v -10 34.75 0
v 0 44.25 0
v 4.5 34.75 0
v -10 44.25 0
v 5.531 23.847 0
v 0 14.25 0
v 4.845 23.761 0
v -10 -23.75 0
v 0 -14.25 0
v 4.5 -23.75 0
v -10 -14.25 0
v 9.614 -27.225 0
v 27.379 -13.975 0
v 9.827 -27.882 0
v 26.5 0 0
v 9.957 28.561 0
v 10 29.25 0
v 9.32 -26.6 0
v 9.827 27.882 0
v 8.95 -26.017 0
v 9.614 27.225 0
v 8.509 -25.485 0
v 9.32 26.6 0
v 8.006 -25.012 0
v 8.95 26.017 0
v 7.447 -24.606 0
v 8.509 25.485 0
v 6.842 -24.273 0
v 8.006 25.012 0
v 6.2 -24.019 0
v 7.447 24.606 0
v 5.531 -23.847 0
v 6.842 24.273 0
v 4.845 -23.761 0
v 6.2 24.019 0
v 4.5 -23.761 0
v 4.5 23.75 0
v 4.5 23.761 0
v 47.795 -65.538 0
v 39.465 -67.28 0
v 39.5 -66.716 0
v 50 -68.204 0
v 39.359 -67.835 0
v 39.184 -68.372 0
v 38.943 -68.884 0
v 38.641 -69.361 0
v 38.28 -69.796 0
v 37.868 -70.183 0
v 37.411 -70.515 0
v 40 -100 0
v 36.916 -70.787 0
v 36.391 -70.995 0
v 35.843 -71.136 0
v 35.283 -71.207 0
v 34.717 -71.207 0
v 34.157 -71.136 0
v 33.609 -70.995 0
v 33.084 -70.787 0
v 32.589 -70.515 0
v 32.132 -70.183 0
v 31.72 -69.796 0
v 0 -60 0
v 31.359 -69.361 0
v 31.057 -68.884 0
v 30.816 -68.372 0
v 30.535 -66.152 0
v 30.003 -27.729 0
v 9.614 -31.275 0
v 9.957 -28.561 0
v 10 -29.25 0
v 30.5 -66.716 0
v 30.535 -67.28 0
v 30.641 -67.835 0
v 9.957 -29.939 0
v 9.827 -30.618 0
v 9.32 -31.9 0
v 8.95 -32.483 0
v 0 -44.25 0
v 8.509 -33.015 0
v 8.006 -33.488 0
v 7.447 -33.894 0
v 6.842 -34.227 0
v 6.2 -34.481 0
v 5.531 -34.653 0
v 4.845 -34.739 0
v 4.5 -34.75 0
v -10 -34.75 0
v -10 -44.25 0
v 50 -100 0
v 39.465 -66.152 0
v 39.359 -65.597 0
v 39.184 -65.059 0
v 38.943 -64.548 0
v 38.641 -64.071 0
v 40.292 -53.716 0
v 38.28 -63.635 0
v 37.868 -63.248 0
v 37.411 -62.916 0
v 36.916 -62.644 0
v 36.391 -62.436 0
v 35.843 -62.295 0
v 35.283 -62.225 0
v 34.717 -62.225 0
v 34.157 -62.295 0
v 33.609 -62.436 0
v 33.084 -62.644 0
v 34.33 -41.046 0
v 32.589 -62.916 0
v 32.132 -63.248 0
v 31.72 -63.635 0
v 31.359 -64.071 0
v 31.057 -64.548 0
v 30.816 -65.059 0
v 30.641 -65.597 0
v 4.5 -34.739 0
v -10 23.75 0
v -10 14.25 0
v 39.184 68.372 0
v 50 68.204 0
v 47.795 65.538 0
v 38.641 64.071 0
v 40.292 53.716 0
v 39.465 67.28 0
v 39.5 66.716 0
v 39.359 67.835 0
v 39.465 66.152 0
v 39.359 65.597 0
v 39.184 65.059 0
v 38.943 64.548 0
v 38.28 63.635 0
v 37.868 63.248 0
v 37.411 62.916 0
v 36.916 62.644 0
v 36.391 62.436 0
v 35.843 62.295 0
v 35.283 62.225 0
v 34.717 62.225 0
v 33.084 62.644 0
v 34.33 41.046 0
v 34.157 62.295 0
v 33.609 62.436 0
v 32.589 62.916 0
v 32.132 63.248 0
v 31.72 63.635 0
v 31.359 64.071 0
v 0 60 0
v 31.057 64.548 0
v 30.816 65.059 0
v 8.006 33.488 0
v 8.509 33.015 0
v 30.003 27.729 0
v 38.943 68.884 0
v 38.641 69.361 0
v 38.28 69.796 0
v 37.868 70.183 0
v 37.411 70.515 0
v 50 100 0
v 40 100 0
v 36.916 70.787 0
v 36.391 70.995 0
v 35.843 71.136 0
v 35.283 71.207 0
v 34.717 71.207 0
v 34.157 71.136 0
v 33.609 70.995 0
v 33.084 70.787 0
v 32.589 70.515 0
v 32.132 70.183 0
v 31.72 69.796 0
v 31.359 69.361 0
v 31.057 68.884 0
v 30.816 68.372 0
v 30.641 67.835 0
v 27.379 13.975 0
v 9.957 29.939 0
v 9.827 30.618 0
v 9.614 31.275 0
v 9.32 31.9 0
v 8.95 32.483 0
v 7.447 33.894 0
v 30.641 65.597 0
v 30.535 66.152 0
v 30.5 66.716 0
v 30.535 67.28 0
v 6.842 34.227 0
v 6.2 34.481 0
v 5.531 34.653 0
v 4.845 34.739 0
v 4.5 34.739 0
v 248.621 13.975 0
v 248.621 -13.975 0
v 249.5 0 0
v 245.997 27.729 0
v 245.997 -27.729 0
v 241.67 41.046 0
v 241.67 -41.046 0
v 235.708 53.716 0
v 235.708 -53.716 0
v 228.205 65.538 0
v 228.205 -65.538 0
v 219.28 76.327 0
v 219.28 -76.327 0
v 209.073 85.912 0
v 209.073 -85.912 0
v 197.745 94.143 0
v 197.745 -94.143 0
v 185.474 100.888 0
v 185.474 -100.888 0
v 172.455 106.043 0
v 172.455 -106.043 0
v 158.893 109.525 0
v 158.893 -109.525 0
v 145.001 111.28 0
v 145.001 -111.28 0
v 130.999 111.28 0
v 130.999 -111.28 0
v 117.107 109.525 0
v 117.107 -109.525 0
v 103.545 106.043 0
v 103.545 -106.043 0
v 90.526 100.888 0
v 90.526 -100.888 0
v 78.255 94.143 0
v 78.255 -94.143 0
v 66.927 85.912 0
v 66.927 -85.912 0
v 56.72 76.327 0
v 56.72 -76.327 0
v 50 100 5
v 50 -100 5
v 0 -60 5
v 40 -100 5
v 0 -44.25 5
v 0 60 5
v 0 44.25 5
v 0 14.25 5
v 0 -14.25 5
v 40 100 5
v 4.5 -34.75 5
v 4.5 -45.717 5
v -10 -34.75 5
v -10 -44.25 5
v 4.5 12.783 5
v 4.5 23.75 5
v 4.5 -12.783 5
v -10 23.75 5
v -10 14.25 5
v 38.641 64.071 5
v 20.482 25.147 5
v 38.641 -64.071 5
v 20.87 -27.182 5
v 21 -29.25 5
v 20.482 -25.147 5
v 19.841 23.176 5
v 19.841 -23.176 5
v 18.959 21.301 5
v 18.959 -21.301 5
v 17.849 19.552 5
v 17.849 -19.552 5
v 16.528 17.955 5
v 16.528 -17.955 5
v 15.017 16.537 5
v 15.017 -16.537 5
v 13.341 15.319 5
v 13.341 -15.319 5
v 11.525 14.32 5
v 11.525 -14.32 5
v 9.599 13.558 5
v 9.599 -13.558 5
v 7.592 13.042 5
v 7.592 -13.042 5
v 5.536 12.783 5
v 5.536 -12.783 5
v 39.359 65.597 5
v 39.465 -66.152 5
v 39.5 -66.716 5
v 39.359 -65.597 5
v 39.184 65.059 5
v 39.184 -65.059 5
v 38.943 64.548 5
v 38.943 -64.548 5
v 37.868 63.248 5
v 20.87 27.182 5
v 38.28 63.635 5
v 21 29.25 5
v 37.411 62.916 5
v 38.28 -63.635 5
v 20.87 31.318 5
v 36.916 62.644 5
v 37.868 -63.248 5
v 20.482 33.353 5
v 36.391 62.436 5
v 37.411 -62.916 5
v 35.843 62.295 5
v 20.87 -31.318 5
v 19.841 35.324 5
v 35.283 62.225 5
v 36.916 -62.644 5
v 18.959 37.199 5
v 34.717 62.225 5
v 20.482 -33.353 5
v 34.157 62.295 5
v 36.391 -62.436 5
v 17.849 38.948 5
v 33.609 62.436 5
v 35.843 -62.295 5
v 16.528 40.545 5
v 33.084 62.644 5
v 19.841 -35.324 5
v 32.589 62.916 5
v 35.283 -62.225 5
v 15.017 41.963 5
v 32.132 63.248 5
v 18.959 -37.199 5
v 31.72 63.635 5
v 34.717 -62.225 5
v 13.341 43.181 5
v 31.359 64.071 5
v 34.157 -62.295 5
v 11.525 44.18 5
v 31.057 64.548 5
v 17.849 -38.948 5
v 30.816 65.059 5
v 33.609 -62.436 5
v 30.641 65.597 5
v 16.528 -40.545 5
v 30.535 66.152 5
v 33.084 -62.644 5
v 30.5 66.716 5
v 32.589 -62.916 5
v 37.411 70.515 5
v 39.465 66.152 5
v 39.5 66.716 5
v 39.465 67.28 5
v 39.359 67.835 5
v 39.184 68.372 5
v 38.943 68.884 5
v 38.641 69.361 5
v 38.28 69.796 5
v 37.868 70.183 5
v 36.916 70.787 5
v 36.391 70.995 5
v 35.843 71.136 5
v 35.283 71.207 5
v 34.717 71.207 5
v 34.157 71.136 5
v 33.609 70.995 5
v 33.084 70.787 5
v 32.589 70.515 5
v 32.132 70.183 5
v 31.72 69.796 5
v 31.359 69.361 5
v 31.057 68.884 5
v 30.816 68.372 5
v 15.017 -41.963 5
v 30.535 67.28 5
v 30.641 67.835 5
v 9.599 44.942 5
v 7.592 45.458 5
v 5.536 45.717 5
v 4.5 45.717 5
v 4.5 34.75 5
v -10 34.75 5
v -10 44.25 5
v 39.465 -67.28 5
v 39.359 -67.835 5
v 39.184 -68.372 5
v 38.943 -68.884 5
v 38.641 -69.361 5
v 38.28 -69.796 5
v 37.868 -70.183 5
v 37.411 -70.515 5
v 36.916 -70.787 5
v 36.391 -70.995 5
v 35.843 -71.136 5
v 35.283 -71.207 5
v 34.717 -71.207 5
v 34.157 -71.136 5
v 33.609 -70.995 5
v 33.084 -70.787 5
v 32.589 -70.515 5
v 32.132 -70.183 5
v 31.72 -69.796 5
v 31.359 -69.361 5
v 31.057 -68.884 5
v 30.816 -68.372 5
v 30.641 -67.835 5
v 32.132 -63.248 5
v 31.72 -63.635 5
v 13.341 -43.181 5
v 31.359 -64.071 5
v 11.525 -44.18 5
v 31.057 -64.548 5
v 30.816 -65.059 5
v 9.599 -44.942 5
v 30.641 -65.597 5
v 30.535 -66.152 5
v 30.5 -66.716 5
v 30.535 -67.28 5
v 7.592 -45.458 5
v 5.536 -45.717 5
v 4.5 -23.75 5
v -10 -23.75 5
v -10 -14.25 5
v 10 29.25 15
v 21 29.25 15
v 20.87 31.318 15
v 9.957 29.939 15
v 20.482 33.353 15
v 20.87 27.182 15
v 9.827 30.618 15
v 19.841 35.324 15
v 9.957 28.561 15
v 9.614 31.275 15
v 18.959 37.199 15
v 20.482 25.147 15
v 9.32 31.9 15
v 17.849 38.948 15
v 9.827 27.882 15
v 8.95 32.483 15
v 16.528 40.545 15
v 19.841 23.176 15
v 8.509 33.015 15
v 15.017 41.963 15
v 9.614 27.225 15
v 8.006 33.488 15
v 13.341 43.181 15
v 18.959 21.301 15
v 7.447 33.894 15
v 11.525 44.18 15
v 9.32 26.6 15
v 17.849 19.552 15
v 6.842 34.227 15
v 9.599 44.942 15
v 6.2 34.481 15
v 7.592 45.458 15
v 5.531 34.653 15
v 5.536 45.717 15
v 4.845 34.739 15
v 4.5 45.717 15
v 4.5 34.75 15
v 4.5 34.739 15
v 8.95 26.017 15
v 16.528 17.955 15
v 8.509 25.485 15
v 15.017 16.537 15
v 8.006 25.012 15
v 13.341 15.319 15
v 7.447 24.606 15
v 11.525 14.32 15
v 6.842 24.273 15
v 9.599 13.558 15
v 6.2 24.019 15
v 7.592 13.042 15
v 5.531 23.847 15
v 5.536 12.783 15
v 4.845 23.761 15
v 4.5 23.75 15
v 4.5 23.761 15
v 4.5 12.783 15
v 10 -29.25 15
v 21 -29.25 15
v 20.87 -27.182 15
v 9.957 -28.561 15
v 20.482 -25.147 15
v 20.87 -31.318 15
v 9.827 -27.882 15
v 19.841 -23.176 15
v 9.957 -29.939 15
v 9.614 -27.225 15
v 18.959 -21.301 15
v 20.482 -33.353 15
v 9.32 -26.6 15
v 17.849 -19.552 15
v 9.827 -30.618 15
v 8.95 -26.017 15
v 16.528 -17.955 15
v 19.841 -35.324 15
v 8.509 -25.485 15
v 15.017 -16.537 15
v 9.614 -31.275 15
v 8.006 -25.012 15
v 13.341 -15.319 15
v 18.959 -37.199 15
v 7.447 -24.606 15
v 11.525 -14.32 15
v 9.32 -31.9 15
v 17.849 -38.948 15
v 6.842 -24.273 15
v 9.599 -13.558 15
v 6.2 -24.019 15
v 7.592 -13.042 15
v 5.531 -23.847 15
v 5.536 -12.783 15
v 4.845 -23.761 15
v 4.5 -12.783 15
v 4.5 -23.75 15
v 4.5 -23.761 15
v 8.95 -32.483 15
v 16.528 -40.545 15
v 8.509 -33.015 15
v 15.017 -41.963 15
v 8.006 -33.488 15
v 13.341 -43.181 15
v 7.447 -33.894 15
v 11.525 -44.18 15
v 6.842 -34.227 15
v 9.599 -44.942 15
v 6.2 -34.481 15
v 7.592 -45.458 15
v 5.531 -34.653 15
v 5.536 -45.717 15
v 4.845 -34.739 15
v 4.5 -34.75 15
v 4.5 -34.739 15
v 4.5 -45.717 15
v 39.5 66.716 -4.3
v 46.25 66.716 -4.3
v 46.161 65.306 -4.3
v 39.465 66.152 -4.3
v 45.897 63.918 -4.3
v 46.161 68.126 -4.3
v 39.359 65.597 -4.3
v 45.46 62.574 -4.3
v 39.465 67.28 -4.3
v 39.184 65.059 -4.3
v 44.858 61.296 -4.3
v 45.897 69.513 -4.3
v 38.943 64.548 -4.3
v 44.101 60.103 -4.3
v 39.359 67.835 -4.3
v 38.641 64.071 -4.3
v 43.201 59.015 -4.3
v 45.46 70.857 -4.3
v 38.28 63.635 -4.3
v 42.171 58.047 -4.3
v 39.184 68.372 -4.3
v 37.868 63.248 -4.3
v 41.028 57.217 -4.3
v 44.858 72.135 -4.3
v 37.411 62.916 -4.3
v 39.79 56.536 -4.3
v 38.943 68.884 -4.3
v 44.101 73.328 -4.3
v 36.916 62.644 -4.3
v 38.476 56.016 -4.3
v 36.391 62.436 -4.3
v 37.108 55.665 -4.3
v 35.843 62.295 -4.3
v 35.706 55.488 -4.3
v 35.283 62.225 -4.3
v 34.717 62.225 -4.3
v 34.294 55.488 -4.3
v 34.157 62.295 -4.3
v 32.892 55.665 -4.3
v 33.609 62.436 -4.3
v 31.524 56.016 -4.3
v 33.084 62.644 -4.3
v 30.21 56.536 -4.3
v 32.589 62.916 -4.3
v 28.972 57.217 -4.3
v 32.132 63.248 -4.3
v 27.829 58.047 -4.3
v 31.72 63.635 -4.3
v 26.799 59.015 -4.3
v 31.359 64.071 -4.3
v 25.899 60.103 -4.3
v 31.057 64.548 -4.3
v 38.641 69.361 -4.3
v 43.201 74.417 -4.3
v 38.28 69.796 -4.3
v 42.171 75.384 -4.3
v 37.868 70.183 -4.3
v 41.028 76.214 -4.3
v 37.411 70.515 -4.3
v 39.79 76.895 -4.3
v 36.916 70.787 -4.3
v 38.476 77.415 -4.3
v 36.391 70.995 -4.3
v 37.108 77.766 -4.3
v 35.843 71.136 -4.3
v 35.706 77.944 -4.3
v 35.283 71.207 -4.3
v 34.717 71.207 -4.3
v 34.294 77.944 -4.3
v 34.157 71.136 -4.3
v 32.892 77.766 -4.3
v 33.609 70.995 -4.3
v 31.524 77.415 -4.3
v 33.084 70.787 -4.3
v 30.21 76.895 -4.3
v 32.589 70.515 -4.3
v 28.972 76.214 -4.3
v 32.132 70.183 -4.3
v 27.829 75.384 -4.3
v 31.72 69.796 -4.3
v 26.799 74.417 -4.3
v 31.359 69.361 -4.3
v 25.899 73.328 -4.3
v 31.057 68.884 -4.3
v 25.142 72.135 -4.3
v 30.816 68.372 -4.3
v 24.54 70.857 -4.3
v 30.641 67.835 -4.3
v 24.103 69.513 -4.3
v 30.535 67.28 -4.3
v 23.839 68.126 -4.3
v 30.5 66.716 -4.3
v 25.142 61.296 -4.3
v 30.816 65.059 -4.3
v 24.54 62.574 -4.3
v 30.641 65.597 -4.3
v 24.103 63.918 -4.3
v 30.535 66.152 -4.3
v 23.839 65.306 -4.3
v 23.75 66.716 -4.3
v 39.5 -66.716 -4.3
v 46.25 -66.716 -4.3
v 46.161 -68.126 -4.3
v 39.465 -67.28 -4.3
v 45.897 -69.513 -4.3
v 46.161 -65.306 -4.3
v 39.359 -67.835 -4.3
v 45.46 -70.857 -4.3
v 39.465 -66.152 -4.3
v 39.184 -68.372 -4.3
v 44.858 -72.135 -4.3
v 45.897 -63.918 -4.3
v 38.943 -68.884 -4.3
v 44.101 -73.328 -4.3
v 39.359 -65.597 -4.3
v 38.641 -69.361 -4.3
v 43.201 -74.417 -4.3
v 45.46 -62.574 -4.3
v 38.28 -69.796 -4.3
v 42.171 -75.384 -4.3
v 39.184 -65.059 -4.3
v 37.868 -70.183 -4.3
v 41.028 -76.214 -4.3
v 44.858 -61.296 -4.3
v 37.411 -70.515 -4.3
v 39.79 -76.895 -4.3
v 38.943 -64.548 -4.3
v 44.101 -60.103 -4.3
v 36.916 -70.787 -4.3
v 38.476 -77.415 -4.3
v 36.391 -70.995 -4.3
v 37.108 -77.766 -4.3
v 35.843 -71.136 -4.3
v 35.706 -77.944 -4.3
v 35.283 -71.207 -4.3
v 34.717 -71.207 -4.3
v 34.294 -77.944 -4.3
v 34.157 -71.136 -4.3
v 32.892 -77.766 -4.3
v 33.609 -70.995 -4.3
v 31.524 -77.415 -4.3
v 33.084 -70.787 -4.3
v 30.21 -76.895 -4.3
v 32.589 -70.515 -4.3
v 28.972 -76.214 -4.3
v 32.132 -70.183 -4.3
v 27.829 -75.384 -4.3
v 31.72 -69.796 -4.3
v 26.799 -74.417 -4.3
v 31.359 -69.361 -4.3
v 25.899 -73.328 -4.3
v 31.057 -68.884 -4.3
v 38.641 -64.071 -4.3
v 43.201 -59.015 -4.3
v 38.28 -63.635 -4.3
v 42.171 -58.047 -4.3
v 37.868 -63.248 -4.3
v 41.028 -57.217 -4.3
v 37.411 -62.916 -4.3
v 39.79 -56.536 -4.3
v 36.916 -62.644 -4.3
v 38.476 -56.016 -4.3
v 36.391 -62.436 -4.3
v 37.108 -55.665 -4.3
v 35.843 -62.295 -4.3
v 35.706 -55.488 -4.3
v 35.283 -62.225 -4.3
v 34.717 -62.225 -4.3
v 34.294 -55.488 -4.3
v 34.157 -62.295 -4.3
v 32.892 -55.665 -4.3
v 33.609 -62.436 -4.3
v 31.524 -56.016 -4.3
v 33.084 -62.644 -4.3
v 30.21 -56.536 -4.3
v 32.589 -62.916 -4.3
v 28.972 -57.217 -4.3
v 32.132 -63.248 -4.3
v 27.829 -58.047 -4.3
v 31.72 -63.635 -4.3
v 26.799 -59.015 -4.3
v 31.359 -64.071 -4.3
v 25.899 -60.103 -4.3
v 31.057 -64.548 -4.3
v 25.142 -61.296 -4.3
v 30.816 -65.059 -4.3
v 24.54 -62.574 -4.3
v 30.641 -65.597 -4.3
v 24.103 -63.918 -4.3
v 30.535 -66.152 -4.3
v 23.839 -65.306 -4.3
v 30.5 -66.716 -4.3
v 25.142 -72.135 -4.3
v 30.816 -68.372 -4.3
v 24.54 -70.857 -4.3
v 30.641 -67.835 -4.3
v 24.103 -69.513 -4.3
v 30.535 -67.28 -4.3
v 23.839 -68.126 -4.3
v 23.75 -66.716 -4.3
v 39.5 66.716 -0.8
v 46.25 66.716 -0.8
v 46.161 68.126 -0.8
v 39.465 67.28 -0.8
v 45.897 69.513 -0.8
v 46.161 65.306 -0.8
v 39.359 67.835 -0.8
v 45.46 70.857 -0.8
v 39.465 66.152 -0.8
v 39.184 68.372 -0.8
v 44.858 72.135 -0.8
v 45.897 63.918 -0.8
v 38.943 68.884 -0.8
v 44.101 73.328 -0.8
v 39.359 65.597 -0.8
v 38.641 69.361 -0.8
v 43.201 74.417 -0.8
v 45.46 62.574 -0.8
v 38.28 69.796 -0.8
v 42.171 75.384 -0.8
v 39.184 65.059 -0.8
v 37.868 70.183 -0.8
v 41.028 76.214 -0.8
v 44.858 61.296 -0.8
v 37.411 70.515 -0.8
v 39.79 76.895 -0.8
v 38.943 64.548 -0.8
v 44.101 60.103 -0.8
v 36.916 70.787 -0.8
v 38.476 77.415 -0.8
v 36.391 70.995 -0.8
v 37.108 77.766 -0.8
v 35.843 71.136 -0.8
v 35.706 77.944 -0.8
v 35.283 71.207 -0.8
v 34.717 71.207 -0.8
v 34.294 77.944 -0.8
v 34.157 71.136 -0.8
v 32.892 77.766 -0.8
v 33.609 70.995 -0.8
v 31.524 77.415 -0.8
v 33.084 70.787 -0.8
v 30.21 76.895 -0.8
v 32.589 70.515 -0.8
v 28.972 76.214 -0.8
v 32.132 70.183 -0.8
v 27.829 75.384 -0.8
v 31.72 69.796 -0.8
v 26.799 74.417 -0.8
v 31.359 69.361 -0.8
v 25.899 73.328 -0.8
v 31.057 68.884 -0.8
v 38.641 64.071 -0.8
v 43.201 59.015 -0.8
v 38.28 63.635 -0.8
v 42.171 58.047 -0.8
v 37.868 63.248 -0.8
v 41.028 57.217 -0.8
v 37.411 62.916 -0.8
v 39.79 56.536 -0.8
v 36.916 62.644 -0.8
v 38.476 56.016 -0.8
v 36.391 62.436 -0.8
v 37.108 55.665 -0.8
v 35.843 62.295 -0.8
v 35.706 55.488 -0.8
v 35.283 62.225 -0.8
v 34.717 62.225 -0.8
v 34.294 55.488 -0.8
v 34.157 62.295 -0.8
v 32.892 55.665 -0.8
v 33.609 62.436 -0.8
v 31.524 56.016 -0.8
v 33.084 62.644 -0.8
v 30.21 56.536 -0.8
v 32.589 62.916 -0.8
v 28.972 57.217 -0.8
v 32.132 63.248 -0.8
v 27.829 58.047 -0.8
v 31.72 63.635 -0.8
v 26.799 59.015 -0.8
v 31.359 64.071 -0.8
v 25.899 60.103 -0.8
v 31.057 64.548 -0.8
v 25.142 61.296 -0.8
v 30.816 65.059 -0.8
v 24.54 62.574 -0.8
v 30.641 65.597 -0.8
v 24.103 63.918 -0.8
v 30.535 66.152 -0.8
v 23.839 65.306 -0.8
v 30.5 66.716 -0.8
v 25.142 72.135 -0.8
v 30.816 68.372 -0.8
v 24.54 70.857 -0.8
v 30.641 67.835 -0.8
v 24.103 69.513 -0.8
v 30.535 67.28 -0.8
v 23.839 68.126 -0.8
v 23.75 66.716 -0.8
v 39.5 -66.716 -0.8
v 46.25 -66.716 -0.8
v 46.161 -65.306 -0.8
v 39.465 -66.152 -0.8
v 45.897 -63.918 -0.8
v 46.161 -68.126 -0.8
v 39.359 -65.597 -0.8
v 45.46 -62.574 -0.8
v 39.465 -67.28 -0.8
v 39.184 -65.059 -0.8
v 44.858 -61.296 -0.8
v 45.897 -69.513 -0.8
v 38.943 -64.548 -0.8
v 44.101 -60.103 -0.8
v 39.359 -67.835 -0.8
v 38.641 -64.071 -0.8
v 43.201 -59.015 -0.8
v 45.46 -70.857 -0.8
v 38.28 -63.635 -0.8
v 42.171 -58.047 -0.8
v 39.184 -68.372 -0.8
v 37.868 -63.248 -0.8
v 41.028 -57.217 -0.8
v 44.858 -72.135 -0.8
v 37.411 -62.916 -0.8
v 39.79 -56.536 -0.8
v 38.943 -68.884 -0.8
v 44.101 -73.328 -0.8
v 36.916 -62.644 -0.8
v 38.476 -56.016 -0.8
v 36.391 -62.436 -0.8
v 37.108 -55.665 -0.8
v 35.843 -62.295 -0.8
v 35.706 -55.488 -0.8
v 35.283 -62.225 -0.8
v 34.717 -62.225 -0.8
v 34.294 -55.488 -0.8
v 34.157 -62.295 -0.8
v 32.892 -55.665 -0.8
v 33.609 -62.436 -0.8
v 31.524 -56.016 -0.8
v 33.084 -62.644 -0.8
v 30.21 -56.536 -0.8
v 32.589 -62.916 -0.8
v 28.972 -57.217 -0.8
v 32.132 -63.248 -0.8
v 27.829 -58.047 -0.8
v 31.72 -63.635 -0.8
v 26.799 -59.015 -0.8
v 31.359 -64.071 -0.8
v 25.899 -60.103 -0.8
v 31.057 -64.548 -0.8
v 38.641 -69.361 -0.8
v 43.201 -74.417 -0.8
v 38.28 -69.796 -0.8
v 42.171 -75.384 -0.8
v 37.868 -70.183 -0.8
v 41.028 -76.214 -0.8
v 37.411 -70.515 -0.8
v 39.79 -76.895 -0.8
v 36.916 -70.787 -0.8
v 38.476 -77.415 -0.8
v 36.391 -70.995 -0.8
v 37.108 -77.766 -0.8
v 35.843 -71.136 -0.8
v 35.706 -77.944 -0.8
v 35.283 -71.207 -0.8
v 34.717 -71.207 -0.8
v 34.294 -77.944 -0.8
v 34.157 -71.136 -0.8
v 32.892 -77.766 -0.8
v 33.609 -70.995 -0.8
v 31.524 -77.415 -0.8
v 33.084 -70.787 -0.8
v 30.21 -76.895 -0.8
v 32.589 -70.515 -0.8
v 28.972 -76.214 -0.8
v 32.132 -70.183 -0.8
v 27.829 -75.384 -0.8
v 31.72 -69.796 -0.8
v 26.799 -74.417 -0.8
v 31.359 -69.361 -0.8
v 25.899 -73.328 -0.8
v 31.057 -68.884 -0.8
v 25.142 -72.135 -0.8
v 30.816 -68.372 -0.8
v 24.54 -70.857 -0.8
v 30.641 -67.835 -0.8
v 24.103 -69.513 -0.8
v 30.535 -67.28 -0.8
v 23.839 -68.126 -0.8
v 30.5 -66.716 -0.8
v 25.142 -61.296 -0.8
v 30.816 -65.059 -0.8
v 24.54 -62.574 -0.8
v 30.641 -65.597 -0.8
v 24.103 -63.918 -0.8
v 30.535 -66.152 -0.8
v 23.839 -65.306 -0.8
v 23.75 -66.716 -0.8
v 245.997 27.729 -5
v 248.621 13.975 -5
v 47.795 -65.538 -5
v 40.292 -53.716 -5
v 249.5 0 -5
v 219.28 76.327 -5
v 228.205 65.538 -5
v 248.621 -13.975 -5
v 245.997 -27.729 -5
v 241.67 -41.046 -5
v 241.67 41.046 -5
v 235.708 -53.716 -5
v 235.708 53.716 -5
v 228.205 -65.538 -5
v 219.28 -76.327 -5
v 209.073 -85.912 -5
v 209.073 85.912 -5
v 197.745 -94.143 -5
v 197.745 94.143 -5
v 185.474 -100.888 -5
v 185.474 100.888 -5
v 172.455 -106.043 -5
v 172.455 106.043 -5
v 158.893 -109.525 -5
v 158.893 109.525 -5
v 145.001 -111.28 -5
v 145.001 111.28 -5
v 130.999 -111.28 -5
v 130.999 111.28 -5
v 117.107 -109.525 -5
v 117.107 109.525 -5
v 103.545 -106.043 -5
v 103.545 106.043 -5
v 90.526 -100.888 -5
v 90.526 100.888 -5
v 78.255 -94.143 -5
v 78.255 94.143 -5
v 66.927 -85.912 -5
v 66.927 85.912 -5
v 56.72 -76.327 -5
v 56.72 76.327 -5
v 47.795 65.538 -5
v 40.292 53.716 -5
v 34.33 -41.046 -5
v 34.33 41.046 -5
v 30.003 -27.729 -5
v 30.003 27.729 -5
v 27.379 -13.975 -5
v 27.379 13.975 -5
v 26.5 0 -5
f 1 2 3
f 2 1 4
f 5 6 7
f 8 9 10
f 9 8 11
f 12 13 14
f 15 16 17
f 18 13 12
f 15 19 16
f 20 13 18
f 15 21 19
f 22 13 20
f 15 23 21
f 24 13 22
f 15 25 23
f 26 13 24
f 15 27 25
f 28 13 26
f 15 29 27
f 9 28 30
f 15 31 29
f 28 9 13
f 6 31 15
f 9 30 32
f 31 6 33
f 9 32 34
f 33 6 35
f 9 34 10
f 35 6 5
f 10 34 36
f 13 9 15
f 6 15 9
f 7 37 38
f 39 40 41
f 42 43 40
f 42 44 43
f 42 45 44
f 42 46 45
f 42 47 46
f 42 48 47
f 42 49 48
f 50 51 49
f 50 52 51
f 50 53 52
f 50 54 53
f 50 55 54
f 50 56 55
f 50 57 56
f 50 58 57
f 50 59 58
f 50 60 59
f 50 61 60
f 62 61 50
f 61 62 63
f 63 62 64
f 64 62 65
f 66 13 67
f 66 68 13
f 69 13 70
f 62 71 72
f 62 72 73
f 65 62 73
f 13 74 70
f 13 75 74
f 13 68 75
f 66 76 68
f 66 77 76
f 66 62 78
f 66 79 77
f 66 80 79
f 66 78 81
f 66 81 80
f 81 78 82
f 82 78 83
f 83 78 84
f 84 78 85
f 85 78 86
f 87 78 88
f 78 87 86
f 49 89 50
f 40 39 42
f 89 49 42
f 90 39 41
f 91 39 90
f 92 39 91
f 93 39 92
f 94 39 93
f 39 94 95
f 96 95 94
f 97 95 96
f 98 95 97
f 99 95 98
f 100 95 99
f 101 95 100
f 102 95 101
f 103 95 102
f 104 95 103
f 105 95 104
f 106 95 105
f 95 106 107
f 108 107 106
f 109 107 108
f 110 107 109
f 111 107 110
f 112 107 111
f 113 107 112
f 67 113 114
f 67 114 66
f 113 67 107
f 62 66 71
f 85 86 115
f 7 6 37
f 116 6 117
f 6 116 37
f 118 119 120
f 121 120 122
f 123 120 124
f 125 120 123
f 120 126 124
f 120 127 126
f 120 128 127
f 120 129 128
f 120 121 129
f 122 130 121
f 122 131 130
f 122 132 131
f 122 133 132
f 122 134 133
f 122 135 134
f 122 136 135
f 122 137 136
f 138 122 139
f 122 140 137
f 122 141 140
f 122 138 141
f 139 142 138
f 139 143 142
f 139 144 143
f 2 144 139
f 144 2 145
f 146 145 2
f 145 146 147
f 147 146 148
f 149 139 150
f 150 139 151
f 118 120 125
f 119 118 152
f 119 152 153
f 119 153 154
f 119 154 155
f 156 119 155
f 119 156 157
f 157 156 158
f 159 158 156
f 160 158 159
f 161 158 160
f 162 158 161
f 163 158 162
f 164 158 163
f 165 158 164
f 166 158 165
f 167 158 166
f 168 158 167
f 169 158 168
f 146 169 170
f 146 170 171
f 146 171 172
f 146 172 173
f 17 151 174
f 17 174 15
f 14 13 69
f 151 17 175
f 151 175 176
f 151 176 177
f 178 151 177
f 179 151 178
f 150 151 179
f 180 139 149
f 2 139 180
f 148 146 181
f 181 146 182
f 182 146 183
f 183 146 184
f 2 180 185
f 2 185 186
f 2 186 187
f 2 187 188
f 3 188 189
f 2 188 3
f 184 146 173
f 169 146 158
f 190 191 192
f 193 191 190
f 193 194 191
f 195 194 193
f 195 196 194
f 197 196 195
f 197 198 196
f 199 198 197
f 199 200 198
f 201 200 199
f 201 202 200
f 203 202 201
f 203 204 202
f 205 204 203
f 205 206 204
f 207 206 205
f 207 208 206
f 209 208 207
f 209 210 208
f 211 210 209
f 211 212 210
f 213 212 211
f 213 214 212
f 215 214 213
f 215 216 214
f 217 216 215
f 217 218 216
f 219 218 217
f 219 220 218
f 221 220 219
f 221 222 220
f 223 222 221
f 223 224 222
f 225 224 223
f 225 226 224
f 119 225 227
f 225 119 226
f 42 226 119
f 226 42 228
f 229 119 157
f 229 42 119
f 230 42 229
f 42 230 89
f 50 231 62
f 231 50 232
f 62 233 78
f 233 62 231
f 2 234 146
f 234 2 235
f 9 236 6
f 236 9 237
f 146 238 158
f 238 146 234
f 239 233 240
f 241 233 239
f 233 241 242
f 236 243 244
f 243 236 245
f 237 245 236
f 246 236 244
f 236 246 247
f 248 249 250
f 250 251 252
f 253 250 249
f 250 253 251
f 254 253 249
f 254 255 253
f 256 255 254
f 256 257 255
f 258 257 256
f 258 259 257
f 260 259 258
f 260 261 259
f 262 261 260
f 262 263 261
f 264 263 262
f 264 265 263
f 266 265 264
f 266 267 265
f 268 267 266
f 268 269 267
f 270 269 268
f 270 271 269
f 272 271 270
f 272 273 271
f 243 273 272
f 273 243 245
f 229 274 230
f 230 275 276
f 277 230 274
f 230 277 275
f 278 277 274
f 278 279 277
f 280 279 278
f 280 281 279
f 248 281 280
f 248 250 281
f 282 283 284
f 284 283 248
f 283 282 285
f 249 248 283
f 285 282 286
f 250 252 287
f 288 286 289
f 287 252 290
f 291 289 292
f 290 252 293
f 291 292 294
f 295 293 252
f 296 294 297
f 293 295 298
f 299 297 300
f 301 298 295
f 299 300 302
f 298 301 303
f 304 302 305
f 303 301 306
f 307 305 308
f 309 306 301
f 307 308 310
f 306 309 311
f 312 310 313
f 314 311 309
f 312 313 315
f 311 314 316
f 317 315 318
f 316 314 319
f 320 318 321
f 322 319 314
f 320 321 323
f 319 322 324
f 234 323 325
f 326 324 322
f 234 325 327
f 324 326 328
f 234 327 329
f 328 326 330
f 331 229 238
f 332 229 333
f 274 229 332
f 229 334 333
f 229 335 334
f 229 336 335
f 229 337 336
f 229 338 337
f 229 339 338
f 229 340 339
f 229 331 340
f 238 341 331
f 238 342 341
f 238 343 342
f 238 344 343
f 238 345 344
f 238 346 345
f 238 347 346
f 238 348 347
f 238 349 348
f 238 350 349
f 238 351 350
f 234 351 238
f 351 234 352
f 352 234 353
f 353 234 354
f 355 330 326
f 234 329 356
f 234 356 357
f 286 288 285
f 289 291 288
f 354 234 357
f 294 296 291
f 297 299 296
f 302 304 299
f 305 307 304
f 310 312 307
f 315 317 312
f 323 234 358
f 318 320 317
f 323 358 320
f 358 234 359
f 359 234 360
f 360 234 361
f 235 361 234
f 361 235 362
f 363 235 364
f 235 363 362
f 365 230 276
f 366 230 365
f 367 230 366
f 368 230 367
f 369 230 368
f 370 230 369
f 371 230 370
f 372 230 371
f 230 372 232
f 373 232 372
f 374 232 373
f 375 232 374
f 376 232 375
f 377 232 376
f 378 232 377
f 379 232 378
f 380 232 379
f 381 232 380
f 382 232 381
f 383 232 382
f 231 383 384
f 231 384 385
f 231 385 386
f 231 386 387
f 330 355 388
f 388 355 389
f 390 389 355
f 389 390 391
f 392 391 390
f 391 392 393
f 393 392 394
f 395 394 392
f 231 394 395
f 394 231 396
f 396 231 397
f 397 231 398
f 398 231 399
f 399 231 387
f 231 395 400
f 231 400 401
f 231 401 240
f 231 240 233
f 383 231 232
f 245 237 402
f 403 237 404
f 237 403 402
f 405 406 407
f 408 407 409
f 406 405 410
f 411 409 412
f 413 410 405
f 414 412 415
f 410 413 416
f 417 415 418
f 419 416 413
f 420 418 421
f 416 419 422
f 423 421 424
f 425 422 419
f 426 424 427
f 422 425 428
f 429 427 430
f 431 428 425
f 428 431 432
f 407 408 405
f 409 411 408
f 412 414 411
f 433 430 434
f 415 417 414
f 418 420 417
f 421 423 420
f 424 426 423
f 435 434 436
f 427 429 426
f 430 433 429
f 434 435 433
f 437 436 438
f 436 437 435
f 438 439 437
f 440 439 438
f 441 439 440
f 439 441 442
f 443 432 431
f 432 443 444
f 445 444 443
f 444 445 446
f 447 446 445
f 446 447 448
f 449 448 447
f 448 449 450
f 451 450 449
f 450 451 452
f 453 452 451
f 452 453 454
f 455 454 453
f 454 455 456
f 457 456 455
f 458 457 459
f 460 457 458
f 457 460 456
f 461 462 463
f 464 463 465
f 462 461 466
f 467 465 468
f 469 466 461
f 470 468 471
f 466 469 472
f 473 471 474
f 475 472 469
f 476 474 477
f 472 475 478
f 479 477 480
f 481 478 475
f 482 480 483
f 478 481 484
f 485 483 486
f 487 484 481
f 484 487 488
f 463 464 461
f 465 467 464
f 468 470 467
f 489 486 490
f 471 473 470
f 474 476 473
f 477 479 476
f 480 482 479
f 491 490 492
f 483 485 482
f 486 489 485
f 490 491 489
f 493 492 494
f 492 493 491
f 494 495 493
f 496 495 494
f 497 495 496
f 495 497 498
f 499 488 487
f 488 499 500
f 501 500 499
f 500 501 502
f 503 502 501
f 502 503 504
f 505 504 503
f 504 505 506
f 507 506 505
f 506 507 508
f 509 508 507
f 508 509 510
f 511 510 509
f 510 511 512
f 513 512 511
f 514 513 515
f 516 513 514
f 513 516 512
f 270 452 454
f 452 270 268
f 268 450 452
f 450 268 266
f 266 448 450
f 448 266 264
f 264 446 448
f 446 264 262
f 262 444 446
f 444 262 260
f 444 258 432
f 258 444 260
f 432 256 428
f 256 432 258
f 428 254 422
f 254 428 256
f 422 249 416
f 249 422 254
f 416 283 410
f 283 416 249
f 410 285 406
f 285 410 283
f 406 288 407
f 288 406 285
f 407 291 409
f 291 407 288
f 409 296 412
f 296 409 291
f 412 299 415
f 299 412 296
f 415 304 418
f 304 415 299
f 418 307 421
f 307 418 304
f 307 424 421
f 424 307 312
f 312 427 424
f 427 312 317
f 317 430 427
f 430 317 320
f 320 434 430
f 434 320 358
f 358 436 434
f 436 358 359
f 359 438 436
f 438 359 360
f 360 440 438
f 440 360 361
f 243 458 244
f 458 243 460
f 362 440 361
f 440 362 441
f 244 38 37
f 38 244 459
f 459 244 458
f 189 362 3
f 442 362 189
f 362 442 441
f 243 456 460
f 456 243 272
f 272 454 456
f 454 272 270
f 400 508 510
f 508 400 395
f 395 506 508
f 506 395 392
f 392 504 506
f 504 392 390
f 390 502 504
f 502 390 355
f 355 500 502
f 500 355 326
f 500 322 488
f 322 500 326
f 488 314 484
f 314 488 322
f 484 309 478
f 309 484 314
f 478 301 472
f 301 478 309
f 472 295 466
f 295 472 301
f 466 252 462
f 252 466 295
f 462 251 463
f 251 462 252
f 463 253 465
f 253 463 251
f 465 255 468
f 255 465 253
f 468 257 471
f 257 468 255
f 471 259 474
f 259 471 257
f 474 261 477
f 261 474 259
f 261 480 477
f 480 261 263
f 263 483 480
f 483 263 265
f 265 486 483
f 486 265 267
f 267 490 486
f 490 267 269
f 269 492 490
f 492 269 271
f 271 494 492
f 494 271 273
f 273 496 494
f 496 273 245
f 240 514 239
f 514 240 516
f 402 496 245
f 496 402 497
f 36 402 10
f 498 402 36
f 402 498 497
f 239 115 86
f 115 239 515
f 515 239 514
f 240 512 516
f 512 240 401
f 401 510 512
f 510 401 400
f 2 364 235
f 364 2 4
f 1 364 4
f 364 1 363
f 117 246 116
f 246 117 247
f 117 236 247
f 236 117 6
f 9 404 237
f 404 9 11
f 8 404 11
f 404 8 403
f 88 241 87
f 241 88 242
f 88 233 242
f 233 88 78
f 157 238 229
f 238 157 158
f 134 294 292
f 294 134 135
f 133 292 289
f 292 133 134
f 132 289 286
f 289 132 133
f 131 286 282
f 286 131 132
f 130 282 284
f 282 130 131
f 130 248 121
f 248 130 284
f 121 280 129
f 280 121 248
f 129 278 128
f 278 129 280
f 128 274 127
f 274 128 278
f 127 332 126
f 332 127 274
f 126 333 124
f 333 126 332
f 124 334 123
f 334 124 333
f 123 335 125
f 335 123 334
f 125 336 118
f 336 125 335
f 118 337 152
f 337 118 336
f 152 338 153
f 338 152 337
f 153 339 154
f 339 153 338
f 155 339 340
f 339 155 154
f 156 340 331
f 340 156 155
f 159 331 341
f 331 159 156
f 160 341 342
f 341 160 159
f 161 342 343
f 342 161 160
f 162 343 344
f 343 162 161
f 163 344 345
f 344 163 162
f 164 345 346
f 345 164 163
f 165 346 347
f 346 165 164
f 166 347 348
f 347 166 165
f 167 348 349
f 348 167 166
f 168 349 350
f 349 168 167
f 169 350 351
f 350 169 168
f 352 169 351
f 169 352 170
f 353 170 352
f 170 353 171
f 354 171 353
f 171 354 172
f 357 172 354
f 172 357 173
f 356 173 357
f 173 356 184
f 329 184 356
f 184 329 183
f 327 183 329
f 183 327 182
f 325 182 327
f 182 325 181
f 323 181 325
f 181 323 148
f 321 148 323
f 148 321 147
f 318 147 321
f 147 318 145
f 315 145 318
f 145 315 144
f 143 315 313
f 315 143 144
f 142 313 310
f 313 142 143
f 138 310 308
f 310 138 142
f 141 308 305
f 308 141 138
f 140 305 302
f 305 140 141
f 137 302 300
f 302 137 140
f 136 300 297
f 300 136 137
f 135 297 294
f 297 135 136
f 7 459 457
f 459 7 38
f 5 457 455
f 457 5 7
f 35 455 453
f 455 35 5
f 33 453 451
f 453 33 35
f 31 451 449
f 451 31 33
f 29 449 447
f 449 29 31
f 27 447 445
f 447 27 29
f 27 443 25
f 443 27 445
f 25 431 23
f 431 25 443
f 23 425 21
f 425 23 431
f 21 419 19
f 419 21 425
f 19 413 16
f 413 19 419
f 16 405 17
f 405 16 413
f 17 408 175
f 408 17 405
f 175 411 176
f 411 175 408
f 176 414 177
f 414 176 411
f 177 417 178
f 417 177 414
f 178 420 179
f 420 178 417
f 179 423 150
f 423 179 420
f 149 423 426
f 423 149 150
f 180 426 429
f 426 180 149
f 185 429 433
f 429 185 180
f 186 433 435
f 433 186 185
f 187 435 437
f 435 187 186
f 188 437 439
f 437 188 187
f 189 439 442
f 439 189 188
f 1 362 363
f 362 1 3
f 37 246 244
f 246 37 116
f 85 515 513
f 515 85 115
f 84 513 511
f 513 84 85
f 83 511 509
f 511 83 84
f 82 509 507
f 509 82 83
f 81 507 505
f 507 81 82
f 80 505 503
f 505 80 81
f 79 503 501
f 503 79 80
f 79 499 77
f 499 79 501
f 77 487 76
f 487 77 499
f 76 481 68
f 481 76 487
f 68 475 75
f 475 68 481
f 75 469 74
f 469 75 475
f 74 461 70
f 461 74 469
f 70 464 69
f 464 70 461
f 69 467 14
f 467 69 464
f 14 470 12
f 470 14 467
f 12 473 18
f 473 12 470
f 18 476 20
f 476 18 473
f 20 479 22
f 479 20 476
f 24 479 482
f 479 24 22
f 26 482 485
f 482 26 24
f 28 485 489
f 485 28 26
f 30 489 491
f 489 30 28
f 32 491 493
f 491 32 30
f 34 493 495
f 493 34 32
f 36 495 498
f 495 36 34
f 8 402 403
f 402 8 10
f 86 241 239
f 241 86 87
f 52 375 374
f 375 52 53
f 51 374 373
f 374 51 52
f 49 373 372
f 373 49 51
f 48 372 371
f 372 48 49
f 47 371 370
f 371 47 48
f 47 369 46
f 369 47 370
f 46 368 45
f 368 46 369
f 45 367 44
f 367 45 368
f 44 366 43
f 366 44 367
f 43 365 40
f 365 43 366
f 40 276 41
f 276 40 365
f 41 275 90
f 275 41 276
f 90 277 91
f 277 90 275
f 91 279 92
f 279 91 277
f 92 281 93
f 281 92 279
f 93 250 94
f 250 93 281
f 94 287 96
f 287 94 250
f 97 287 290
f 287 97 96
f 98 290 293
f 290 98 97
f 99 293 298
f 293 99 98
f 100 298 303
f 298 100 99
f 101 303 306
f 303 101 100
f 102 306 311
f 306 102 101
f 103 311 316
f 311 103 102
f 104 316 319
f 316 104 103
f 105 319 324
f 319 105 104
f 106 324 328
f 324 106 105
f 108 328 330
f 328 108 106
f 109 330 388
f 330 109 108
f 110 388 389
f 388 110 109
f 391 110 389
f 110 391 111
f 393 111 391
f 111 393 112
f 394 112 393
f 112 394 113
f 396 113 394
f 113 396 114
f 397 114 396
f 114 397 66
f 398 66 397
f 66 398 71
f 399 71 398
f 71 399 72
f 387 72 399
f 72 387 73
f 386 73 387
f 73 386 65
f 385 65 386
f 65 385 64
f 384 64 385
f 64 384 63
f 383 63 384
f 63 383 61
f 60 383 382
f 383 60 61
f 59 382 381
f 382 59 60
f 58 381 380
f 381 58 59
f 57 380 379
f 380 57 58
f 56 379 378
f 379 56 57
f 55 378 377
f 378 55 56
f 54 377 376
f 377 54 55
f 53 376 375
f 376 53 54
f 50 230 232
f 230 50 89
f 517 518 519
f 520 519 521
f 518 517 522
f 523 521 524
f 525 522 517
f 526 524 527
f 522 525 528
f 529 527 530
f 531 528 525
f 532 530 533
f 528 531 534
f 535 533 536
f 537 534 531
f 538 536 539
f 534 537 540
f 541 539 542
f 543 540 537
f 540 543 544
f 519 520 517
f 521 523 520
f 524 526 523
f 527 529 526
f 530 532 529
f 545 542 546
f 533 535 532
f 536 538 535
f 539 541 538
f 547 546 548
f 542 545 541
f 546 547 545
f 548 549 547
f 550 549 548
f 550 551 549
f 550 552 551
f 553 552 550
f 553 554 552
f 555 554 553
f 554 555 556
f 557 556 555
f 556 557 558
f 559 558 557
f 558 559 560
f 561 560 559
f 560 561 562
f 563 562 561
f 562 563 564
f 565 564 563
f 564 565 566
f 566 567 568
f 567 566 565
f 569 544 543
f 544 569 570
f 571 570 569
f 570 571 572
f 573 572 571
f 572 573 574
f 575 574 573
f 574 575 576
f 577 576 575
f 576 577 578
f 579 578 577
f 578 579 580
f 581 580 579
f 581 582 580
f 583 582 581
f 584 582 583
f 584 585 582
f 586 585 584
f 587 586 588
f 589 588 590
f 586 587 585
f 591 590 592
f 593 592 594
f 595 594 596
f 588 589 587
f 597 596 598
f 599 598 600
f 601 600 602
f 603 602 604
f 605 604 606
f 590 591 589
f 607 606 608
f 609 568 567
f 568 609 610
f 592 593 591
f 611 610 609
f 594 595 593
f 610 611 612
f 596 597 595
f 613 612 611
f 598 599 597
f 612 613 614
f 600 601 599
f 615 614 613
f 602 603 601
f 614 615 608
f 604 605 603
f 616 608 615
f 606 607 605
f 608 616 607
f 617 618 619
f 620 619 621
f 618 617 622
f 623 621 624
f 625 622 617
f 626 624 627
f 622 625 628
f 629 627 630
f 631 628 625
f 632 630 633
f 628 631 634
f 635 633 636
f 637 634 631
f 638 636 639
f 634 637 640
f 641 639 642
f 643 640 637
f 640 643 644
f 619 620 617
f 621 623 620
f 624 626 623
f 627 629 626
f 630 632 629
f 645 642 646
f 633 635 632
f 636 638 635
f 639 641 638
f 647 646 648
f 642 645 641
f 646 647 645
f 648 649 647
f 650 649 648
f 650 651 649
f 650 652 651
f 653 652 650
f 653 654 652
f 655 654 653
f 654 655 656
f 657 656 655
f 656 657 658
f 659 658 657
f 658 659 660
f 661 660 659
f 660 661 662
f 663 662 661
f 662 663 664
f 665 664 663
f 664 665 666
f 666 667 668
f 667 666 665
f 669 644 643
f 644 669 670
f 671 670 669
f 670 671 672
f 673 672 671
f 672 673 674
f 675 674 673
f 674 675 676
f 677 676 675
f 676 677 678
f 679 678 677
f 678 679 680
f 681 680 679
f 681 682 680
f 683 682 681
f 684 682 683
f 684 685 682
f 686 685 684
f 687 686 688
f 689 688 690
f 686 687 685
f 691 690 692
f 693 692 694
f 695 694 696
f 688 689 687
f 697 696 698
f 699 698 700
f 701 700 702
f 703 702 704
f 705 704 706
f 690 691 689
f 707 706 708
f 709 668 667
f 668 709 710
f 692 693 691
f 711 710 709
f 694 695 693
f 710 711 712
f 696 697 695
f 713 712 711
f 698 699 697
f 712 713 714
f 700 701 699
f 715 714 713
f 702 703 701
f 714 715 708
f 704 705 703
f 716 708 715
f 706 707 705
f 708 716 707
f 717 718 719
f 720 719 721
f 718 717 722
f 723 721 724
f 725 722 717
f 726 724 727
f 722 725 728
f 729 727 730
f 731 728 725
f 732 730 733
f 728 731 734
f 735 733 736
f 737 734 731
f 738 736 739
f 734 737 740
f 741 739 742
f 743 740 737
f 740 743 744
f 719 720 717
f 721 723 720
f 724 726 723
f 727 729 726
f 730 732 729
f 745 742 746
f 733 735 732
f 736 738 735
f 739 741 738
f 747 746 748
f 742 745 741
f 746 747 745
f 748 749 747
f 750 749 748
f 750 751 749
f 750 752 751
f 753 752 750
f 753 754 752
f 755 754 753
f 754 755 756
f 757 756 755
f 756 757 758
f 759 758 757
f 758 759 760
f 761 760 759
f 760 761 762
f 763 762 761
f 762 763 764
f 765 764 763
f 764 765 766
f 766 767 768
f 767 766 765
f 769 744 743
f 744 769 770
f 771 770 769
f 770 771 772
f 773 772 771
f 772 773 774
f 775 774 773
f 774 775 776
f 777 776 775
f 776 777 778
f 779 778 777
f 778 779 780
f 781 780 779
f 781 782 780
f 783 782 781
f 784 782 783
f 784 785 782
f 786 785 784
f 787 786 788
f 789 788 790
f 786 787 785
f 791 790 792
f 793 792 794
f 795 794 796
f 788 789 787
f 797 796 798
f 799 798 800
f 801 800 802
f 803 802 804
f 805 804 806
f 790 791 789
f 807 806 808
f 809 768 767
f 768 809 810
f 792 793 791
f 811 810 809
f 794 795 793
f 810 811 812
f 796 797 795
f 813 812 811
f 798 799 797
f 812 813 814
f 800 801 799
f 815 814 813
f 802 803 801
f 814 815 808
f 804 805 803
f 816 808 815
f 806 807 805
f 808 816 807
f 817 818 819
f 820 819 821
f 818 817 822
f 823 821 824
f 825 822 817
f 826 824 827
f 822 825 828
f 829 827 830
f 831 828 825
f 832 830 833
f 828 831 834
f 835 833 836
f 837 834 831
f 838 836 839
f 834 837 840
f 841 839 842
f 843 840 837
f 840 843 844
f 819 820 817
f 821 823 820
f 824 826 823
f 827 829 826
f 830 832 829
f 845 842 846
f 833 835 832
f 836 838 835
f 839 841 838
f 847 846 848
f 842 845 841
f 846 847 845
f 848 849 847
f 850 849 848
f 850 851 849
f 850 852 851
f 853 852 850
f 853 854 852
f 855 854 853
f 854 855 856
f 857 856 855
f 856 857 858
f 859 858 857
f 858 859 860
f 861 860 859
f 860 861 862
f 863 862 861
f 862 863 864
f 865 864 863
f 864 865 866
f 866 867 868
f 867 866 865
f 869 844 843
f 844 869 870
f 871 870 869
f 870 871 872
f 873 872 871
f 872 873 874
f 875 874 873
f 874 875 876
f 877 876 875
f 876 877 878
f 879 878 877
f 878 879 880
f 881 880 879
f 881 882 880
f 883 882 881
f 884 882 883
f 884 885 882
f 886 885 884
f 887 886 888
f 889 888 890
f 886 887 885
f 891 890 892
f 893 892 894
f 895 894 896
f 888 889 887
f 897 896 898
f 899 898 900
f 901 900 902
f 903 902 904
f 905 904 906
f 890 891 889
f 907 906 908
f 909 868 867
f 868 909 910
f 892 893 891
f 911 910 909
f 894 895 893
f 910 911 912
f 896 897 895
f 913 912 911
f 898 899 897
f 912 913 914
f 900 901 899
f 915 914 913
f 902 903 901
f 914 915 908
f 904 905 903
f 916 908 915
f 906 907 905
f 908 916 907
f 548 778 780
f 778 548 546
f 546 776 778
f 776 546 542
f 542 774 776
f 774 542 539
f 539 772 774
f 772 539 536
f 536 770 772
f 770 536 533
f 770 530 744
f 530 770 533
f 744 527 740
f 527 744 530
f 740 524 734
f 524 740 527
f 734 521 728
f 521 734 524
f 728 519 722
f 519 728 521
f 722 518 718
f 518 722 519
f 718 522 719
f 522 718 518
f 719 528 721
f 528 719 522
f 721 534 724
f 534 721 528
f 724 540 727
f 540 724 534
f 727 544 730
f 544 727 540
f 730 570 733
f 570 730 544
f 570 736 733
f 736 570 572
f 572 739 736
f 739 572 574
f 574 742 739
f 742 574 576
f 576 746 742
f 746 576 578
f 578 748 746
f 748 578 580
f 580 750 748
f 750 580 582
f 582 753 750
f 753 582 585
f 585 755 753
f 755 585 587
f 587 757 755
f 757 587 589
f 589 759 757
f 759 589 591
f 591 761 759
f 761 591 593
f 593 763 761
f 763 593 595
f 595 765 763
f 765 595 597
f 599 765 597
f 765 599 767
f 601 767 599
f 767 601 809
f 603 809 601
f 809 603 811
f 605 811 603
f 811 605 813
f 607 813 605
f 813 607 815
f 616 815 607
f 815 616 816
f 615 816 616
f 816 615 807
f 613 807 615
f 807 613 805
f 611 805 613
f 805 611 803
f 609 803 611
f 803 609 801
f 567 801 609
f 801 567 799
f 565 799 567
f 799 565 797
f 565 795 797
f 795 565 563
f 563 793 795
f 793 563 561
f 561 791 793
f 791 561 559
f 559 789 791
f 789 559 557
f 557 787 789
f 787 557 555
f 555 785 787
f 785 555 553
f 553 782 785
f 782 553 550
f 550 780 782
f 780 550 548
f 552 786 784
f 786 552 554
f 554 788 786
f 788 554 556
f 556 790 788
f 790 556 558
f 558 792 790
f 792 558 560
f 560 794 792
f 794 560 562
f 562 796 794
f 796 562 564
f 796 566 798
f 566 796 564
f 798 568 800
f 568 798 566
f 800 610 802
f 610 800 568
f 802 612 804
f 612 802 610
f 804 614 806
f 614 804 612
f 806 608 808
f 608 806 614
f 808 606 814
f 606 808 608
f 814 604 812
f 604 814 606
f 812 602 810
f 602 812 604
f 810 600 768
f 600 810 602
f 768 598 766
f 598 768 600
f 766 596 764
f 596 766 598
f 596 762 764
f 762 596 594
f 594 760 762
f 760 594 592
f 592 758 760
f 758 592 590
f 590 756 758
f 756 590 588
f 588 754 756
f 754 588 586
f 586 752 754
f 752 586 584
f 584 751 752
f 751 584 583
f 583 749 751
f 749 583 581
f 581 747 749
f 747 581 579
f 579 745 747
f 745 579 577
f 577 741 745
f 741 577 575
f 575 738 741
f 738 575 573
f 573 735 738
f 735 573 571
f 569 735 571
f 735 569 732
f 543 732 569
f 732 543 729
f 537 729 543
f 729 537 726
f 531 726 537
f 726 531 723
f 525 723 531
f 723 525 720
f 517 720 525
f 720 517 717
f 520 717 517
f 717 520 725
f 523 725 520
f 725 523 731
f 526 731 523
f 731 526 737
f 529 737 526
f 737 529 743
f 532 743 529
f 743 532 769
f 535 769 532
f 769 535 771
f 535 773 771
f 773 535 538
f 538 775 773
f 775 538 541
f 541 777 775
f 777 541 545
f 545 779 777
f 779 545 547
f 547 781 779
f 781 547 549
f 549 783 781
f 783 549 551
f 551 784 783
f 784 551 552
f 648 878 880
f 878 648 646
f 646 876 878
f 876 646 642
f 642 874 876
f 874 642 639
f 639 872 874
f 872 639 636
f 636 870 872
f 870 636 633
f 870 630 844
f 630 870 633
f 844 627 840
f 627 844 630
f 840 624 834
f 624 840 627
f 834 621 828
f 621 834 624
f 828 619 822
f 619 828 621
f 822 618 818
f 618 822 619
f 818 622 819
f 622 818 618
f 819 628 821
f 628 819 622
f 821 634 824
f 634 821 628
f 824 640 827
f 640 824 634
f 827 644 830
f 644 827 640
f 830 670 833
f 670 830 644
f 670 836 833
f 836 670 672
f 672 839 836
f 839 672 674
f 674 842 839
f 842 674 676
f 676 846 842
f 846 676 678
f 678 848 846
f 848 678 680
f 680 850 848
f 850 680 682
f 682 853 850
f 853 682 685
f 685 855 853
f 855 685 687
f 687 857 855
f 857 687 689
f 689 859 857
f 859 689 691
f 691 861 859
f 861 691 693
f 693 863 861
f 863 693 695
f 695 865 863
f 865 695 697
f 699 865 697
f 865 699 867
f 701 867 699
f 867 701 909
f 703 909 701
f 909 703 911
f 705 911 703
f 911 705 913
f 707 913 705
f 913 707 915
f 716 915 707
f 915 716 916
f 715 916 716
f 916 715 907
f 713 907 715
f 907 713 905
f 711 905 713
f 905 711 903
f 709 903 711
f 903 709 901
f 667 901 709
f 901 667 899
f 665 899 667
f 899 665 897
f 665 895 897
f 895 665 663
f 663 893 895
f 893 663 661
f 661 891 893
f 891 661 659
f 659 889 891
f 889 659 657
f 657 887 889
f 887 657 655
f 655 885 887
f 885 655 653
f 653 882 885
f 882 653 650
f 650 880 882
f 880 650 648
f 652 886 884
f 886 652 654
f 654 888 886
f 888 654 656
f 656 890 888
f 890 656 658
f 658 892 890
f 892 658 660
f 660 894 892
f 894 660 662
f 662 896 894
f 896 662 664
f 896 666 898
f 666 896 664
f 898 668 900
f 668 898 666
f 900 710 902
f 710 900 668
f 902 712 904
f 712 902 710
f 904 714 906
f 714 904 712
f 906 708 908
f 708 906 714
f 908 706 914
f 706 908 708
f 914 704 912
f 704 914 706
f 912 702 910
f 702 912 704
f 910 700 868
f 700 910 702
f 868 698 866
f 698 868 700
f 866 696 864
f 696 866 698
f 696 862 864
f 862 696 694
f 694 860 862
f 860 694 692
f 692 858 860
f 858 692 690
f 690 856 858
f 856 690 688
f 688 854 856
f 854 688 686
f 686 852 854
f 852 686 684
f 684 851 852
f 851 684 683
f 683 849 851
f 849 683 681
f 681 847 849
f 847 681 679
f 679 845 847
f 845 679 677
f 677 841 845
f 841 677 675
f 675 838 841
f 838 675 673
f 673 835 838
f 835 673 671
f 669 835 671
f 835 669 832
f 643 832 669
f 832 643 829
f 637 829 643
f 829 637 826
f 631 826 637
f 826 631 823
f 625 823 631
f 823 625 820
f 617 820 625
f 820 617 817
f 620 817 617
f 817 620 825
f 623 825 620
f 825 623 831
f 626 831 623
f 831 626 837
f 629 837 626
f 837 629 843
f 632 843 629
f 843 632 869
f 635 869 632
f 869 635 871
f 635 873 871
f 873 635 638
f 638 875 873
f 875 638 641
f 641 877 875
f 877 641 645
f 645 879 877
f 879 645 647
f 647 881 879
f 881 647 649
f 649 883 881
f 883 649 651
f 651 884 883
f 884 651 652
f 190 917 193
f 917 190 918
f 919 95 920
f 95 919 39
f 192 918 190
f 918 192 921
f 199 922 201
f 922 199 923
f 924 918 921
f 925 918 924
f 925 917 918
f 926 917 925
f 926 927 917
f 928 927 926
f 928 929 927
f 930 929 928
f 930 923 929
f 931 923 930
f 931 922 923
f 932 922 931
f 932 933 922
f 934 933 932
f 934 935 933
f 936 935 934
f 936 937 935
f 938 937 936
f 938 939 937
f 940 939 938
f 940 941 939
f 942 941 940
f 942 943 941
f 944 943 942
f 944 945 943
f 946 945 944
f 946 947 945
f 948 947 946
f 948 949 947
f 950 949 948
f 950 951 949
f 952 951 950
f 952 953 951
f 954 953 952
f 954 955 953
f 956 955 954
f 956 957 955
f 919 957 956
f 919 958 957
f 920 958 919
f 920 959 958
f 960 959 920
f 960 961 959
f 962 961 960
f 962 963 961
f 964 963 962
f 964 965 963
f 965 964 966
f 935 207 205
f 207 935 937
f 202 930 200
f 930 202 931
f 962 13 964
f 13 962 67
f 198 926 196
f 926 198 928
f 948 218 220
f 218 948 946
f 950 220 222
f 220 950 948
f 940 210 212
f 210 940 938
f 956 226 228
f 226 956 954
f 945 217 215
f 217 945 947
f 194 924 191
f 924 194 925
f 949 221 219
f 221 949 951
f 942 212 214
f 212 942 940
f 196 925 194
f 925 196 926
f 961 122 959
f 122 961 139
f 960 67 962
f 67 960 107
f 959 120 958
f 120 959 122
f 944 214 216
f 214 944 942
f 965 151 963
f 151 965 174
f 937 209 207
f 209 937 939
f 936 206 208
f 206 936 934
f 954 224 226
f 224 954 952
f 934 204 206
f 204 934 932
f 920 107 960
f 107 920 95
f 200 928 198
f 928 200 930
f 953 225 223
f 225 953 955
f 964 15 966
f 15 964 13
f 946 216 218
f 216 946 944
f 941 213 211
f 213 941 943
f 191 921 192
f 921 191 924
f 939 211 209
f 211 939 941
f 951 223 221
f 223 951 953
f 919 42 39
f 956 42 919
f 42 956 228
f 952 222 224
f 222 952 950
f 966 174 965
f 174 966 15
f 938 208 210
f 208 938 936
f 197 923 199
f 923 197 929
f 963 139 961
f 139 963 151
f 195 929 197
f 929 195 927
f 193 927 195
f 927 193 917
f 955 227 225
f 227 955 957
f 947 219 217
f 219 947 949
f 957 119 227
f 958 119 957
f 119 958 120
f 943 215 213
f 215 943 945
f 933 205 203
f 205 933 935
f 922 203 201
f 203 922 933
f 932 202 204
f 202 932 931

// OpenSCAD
// mm

ab = 120;
h = 50;
at = ab+2*h;
d = 20; d2 = sqrt(2)*d;
bearing_outer_diam = 22 + 0.5; // with offset
bearing_inner_diam = 8 + 1; // with offset
bearing_thickness = 3.5; // approximate

pad = 0.8;

axis_radius = (10+1)/2; // with offset
axis_distance = 68.5 - 10;
cut_depth = 10;

z1 = 5;
z2 = 10;

$fa = 0.01;
$fn = 50;

module global_cuts() {
 translate([0, 0, -z2]) linear_extrude(3*z2) union() {
  translate([cut_depth - axis_radius, axis_distance/2]) circle(axis_radius);
  translate([cut_depth - axis_radius, -axis_distance/2]) circle(axis_radius);
  translate([-100, axis_distance/2 - axis_radius]) square([cut_depth - axis_radius + 100, 2*axis_radius]);
  translate([-100, (-axis_distance/2) - axis_radius]) square([cut_depth - axis_radius + 100, 2*axis_radius]);
  translate([(h+d)/2, (at/2 - d2 + ab/2 + d - d2)/2]) circle(d=bearing_inner_diam);
  translate([(h+d)/2, (-ab/2 - d + d2 -at/2 + d2)/2]) circle(d=bearing_inner_diam);
  translate([0, at/2-10]) square([h+1, 1000]);
  translate([0, -(1000+at/2-10)]) square([h+1, 1000]);
 }
}

module bearings() {
 translate([0, 0, - bearing_thickness - pad]) linear_extrude(bearing_thickness) {
  difference() {
   union() {
    translate([(h+d)/2, (at/2 - d2 + ab/2 + d - d2)/2]) circle(d=bearing_outer_diam);
    translate([(h+d)/2, (-ab/2 - d + d2 -at/2 + d2)/2]) circle(d=bearing_outer_diam);
   }
   union() {
    translate([(h+d)/2, (at/2 - d2 + ab/2 + d - d2)/2]) circle(d=bearing_inner_diam);
    translate([(h+d)/2, (-ab/2 - d + d2 -at/2 + d2)/2]) circle(d=bearing_inner_diam);
   }
  }
 }
}

module thin_contour() {
 linear_extrude(z1) polygon([[0, -ab/2], [0,ab/2], [h, at/2], [h,-at/2]]);
}

sq_depth = 10;

module to_axes() {
 linear_extrude(z1 + sq_depth) {
  intersection() {
   union() {
    translate([cut_depth - axis_radius, axis_distance/2]) circle(axis_radius*3);
    translate([cut_depth - axis_radius, -axis_distance/2]) circle(axis_radius*3);
   }
   translate([cut_depth - axis_radius, -50]) square(100, 100);
  }

 }
}

add_w = 30;
add_h = 10;
module additional_base() {
 linear_extrude(z1) {
  translate([-add_h, axis_distance/2 - add_w/2]) square([add_h, add_w]);
  translate([-add_h, -axis_distance/2 - add_w/2]) square([add_h, add_w]);
 }
}

module holder() {
 difference() {
  union() {
   thin_contour();
   to_axes();
   additional_base();
  }
  union() {
   global_cuts();
  }
 }
}

module spools_100() {
 #translate([127, 0, z1]) linear_extrude(5) circle(d=197);
 #translate([143, 0, z1]) linear_extrude(5) circle(d=223);
}

module spools_120() {
 //#translate([122, 0, -z1]) linear_extrude(5) circle(d=197);
 #translate([138, 0, -z1]) linear_extrude(5) circle(d=223);
}

holder();
bearings();
spools_120();
